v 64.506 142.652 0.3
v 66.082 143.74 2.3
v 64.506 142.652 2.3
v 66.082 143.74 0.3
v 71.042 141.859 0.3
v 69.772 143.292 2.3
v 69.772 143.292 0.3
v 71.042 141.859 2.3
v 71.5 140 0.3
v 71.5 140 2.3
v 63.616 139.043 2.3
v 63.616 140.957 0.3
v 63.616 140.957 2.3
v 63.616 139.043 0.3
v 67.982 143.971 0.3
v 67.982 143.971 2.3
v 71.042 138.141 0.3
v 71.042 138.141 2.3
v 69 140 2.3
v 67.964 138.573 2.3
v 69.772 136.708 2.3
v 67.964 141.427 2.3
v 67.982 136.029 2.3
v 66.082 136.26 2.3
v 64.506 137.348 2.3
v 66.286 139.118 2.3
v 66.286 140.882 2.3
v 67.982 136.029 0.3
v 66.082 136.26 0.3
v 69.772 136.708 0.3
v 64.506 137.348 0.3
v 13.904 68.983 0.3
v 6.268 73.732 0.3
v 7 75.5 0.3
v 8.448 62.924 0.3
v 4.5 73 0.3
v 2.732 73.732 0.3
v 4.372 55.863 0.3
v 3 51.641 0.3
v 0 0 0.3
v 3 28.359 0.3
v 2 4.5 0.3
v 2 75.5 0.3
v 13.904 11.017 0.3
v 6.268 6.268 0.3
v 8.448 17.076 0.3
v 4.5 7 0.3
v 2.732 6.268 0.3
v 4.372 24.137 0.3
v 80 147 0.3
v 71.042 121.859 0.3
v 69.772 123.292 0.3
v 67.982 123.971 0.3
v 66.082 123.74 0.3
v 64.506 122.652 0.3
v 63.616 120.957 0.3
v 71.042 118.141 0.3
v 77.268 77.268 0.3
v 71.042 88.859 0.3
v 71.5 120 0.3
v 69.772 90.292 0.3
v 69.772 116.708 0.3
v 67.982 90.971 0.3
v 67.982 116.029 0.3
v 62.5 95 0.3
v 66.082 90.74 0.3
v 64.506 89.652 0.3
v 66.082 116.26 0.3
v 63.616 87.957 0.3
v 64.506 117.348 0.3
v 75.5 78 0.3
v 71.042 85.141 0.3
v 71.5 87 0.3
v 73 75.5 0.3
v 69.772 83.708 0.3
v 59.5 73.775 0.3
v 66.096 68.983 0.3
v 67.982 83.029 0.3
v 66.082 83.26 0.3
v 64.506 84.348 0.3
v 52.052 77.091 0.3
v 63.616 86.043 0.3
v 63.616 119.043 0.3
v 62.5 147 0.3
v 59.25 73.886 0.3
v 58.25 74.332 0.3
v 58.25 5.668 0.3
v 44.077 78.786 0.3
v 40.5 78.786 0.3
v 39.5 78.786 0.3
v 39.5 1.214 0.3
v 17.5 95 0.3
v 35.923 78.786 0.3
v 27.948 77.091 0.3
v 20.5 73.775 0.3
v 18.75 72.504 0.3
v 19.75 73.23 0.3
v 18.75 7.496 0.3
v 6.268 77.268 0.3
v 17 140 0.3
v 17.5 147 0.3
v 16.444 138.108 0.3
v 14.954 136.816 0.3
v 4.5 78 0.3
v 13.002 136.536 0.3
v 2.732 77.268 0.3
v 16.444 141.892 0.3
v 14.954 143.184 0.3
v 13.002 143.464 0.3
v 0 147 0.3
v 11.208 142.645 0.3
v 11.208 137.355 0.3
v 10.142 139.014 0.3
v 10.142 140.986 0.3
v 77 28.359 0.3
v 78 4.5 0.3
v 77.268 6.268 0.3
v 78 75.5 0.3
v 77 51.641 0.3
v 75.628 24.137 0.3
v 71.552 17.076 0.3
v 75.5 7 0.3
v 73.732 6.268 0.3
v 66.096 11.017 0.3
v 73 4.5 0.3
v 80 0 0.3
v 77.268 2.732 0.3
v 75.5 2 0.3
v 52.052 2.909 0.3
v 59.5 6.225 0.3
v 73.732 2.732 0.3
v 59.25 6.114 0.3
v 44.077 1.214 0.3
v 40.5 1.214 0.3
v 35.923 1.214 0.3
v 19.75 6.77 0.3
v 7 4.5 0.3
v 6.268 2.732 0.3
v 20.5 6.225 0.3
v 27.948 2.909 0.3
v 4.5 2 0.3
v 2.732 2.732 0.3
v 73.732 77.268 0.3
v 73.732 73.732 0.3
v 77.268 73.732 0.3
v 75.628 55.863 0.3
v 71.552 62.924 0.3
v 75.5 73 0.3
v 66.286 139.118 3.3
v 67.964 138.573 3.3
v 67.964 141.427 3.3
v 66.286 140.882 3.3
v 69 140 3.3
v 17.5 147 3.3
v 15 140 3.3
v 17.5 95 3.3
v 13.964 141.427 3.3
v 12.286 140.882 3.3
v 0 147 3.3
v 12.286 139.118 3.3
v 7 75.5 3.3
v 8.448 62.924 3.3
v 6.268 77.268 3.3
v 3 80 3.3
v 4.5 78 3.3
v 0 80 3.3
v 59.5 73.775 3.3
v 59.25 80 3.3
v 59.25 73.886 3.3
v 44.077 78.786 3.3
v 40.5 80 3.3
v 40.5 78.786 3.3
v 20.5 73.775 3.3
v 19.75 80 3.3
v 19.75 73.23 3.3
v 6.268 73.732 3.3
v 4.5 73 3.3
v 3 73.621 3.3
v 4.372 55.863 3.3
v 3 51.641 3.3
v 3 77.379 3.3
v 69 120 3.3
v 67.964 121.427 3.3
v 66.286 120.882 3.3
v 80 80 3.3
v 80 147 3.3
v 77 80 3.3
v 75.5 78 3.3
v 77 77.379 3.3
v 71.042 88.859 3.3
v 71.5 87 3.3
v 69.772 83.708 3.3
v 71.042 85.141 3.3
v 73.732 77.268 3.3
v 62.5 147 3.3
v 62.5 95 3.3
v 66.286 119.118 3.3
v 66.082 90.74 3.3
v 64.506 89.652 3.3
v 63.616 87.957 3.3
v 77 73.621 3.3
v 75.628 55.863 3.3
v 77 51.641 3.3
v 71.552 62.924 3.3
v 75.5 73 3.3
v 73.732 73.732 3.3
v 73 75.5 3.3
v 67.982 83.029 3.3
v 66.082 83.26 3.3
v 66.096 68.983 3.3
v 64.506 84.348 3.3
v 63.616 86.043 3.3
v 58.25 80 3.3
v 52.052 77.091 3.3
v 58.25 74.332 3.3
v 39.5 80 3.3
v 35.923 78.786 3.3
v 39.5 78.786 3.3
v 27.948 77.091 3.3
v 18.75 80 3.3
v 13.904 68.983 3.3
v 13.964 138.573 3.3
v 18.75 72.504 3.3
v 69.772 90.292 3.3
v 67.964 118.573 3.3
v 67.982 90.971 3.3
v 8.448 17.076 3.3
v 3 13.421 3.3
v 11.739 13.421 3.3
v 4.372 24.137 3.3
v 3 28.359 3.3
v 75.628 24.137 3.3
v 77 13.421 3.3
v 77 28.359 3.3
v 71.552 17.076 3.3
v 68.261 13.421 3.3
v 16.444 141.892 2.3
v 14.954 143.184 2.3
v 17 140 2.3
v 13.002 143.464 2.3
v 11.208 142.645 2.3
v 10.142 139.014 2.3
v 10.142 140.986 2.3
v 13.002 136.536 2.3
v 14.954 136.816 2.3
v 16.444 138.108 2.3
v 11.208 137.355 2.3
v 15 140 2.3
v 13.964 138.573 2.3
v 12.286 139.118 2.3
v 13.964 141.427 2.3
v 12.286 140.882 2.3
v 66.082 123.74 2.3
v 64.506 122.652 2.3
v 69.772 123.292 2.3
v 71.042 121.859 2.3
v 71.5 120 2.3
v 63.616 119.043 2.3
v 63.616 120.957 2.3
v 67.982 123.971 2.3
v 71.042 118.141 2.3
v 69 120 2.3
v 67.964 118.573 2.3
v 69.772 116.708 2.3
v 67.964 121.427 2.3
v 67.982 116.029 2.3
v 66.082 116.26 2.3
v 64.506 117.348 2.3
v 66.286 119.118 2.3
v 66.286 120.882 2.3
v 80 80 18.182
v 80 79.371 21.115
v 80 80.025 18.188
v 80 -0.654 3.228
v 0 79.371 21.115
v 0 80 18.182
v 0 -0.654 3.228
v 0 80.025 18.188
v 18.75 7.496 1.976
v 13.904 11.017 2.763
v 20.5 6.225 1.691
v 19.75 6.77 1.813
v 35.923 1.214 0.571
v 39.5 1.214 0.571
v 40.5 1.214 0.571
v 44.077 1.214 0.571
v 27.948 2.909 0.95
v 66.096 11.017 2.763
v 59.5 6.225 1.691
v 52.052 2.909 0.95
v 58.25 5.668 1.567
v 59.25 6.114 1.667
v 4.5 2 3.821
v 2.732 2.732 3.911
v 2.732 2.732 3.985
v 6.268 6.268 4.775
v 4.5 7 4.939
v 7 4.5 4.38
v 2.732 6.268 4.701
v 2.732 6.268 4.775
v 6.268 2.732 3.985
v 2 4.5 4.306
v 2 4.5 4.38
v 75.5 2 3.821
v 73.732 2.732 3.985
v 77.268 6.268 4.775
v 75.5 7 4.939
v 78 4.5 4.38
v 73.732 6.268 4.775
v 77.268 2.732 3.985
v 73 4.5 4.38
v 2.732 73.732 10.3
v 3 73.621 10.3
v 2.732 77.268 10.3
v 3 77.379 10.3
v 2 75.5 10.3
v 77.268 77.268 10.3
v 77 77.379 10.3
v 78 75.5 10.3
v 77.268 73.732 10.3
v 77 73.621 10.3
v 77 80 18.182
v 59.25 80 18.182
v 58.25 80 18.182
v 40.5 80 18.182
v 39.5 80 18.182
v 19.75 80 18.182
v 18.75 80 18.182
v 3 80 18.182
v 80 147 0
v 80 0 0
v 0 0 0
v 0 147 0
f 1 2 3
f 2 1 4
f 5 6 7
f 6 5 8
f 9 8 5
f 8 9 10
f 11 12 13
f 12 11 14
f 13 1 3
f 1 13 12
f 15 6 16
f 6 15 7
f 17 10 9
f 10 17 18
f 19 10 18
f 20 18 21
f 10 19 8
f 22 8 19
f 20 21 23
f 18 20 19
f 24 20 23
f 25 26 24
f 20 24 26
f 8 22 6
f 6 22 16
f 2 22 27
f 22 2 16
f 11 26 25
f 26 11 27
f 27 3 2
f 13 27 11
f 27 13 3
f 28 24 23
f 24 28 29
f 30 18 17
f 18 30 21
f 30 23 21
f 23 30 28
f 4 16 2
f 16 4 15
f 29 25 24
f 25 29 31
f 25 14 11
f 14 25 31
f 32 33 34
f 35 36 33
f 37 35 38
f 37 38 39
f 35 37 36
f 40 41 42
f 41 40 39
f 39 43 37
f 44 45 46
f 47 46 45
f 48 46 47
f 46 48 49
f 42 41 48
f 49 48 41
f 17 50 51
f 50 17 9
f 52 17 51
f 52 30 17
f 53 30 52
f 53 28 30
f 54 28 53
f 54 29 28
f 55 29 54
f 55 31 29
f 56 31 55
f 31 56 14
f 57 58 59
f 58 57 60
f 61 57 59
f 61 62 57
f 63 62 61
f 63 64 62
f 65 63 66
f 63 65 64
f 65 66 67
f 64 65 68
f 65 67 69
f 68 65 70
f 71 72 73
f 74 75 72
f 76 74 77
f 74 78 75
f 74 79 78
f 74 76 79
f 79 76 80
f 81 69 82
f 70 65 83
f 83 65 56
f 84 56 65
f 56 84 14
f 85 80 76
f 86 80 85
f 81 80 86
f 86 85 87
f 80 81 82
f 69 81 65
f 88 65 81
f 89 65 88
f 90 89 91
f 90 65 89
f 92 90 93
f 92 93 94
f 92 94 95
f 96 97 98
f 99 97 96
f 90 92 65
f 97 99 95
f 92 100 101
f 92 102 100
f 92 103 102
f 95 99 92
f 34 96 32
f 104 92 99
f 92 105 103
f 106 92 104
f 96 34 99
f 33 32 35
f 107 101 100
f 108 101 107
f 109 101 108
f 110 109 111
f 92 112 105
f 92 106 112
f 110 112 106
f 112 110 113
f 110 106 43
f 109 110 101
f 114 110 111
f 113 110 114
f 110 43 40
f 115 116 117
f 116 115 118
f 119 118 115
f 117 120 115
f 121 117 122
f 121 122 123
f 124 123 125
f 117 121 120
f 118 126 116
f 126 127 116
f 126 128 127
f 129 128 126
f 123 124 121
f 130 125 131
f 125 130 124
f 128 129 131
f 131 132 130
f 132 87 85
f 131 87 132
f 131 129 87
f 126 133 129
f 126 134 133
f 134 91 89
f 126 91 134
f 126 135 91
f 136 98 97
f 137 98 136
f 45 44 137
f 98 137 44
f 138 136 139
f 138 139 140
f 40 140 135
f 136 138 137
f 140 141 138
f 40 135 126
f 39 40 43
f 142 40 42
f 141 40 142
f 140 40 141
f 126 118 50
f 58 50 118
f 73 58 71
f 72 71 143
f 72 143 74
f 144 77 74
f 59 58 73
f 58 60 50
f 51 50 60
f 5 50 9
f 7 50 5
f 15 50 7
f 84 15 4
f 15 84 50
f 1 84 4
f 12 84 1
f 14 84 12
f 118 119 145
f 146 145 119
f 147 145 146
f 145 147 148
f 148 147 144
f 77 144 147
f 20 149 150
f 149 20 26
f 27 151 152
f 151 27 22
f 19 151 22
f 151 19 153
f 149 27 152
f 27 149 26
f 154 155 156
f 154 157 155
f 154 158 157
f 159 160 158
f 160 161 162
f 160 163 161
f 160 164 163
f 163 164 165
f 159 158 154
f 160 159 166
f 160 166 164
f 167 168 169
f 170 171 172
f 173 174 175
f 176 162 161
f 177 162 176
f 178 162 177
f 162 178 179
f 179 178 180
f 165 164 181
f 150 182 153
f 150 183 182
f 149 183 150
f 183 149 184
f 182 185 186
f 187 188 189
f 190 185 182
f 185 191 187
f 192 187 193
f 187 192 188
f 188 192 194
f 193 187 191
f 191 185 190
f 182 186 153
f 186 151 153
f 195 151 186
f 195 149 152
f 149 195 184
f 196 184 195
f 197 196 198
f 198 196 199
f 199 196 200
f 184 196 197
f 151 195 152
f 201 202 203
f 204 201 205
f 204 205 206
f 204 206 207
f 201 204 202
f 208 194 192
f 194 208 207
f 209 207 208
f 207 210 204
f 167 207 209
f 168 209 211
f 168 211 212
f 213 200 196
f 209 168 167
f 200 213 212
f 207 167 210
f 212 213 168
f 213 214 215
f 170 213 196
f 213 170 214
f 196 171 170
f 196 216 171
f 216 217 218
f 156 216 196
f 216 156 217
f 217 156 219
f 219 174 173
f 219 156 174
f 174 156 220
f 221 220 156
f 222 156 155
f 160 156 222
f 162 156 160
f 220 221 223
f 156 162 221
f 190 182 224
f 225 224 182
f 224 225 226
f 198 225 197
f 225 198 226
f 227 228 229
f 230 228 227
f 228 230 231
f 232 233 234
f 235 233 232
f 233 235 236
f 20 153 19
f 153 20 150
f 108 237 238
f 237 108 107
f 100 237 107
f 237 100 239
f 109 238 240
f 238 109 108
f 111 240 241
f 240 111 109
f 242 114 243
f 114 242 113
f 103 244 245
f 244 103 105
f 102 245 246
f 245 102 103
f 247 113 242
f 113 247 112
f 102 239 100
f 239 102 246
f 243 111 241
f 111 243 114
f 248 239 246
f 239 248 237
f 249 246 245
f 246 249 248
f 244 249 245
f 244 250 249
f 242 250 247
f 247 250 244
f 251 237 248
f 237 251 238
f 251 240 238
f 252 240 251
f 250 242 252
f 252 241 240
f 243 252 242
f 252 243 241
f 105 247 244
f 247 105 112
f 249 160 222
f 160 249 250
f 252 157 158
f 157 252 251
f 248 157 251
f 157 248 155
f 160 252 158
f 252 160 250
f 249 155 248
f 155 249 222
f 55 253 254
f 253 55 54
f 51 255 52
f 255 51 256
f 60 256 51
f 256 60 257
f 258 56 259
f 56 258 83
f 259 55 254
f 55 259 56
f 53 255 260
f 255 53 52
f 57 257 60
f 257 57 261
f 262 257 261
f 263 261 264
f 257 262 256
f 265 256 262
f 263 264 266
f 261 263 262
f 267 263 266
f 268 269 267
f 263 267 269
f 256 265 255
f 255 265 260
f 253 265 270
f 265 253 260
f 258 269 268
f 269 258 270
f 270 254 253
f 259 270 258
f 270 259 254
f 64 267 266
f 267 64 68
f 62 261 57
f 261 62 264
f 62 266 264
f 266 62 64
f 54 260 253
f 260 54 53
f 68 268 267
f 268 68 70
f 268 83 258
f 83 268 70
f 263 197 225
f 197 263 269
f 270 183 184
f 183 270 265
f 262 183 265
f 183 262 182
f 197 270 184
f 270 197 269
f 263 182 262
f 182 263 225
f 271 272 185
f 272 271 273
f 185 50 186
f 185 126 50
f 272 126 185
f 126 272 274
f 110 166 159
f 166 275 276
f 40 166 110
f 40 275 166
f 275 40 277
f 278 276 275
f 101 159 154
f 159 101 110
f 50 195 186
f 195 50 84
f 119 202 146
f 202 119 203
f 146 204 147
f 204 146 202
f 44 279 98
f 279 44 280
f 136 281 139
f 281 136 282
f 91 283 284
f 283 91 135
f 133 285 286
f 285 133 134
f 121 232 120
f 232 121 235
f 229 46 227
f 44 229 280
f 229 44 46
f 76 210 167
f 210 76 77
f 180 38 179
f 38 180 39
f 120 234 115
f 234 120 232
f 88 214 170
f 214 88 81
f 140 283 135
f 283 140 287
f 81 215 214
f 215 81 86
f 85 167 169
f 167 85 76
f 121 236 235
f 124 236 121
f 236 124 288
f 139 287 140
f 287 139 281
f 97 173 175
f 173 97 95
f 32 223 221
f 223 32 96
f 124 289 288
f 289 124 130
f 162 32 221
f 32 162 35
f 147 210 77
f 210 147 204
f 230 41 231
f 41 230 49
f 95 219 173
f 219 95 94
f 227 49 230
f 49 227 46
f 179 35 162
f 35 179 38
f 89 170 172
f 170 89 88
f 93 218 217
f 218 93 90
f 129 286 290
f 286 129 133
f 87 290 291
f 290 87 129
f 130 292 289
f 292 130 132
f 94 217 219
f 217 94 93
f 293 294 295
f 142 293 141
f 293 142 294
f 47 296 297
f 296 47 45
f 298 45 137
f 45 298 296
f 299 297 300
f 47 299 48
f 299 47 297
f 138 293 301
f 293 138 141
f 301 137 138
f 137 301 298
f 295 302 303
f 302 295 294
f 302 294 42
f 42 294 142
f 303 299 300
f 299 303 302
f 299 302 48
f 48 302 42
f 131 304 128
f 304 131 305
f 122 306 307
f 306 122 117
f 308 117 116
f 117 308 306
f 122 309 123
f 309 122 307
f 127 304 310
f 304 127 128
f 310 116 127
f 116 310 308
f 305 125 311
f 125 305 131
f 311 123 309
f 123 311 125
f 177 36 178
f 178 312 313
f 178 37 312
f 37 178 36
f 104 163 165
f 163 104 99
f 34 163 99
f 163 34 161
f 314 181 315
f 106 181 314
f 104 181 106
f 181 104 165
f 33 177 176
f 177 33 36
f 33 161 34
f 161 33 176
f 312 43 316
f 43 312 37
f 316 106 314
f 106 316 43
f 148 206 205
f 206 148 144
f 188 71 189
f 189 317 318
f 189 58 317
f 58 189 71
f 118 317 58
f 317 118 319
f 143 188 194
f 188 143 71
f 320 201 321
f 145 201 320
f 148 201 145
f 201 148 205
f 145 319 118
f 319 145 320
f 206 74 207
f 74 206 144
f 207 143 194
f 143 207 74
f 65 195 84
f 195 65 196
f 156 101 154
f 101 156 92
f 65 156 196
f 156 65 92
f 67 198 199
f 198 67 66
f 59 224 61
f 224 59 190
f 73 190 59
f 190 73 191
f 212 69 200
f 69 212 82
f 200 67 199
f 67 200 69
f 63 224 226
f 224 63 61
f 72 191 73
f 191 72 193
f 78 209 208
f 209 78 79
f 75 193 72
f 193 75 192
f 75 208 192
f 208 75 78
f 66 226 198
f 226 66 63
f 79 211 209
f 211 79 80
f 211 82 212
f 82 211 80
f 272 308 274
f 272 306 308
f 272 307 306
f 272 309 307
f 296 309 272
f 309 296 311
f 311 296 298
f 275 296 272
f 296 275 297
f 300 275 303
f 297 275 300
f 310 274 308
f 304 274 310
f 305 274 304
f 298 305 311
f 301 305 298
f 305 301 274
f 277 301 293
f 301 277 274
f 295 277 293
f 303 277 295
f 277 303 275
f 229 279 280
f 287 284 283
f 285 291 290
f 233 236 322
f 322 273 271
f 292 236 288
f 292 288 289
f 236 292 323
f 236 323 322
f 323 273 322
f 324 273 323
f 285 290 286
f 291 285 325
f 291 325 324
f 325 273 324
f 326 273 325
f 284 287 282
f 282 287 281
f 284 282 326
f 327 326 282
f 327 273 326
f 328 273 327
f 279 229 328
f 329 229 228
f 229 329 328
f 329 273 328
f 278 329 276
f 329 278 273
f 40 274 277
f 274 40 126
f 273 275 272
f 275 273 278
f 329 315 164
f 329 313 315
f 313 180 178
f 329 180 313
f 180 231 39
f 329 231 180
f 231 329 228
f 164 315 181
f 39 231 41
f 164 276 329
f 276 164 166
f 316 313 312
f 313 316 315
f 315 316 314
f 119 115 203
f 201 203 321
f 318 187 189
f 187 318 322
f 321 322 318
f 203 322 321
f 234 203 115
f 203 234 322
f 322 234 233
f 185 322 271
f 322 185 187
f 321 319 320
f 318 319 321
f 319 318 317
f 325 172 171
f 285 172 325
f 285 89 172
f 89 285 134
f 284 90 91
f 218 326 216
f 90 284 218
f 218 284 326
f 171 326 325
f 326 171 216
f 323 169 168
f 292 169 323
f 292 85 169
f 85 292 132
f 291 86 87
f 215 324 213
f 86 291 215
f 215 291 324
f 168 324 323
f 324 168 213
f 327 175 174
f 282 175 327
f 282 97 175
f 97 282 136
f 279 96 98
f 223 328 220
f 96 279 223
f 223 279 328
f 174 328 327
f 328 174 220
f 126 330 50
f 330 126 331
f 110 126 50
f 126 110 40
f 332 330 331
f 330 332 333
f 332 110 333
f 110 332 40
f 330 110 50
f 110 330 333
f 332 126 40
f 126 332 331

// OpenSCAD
cube([80,147,0.3]);

translate([0,0,.3]) union()
{
difference()
{
cube([80,147,3]);
translate([40,40,0]) cylinder(h=3, d=78);
translate([4.5,4.5,0]) cylinder(h=3, d=5);
translate([75.5, 4.5,0]) cylinder(h=3,d=5);
translate([4.5,75.5, 0]) cylinder(h=3,d=5);
translate([75.5,75.5, 0]) cylinder(h=3,d=5);
translate([17.5,95,0]) cube([45,52,3]);
translate([67.5,140,0]) union()
{
	cylinder(h=2,d=8);
	cylinder(h=3,d=3);
}
translate([13.5, 140,0]) union()
{
	cylinder(h=2,d=7);
	cylinder(h=3,d=3);
}

translate([67.5,120,0]) union()
{
	cylinder(h=2,d=8);
	cylinder(h=3,d=3);
}

translate([67.5,87,0]) union()
{
	cylinder(h=3,d=8);
}
}
difference()
{
rotate(a=[12.6,0,0]) cube([80,82,3]);
translate([4.5,4.5,0]) cylinder(h=10, d=5);
translate([75.5, 4.5,0]) cylinder(h=10,d=5);
translate([4.5,75.5, 0]) cylinder(h=10,d=5);
translate([75.5,75.5,0]) cylinder(h=10,d=5);
}
difference()
{
cube([3,80,18]);
translate([0,0,3]) rotate(a=[12.6,0,0]) cube([3,82,21]);
translate([4.5,4.5,0]) cylinder(h=10, d=5);
translate([75.5, 4.5,0]) cylinder(h=10,d=5);
translate([4.5,75.5, 0]) cylinder(h=10,d=5);
translate([75.5,75.5,0]) cylinder(h=10,d=5);
}

translate([77,0,0]) difference()
{
cube([3,80,18]);
translate([0,0,3]) rotate(a=[12.6,0,0]) cube([3,82,21]);
translate([0,4.5,0]) cylinder(h=10,d=5);
translate([-1.5,75.5,0]) cylinder(h=10,d=5);
}

translate([39.5,0,0]) difference()
{
cube([1,80,18]);
translate([0,0,3]) rotate(a=[12.6,0,0]) cube([1,82,21]);
}

translate([58.25,0,0]) difference()
{
cube([1,80,18]);
translate([0,0,3]) rotate(a=[12.6,0,0]) cube([1,82,21]);
}

translate([18.75,0,0]) difference()
{
cube([1,80,18]);
translate([0,0,3]) rotate(a=[12.6,0,0]) cube([1,82,21]);
}
}
